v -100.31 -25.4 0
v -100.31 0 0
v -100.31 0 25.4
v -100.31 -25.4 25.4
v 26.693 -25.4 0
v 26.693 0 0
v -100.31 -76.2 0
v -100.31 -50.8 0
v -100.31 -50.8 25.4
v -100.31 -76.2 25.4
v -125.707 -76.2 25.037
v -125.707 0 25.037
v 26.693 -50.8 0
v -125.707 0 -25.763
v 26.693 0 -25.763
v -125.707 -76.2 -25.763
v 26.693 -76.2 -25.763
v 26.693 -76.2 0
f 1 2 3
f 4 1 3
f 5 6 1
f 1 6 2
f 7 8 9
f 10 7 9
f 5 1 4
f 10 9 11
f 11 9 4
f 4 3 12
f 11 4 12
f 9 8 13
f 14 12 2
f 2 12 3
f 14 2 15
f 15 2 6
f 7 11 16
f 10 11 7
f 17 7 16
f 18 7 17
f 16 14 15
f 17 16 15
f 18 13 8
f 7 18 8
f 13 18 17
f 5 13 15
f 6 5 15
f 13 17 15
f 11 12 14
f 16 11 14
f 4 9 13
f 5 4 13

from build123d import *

# Parameters (mm, degrees)
F1_DEPTH = 76.2
F2_W     = 127.0025914325
F2_H     = 25.4
F3_DEPTH = 25.4
F5_DEPTH = 25.4


with BuildPart() as f1:
    # F0 (on Front) → F1 (new body)
    with BuildSketch(Plane.XZ):
        Polygon((-100.3097782258, 25.4), (-125.7071867934, 25.0371804097), (-125.7071867934, -25.7628195903), (26.6928132066, -25.7628195903), (26.6928132066, 0), (-100.3097782258, 0), align=None)
    extrude(amount=F1_DEPTH)

    # F2 (on face) → F3 (join)
    with BuildSketch(Plane.XY):
        with Locations((-36.8084825096, -38.1)):
            Rectangle(F2_W, F2_H)
    extrude(amount=F3_DEPTH)

    # F4 (on face) → F5 (cut)
    with BuildSketch(Plane.XZ.offset(50.8)):
        Polygon((26.6928132066, 25.4), (-100.3097782258, 25.4), (26.6928132066, 0), align=None)
    extrude(amount=-F5_DEPTH, mode=Mode.SUBTRACT)


solid = f1.part
